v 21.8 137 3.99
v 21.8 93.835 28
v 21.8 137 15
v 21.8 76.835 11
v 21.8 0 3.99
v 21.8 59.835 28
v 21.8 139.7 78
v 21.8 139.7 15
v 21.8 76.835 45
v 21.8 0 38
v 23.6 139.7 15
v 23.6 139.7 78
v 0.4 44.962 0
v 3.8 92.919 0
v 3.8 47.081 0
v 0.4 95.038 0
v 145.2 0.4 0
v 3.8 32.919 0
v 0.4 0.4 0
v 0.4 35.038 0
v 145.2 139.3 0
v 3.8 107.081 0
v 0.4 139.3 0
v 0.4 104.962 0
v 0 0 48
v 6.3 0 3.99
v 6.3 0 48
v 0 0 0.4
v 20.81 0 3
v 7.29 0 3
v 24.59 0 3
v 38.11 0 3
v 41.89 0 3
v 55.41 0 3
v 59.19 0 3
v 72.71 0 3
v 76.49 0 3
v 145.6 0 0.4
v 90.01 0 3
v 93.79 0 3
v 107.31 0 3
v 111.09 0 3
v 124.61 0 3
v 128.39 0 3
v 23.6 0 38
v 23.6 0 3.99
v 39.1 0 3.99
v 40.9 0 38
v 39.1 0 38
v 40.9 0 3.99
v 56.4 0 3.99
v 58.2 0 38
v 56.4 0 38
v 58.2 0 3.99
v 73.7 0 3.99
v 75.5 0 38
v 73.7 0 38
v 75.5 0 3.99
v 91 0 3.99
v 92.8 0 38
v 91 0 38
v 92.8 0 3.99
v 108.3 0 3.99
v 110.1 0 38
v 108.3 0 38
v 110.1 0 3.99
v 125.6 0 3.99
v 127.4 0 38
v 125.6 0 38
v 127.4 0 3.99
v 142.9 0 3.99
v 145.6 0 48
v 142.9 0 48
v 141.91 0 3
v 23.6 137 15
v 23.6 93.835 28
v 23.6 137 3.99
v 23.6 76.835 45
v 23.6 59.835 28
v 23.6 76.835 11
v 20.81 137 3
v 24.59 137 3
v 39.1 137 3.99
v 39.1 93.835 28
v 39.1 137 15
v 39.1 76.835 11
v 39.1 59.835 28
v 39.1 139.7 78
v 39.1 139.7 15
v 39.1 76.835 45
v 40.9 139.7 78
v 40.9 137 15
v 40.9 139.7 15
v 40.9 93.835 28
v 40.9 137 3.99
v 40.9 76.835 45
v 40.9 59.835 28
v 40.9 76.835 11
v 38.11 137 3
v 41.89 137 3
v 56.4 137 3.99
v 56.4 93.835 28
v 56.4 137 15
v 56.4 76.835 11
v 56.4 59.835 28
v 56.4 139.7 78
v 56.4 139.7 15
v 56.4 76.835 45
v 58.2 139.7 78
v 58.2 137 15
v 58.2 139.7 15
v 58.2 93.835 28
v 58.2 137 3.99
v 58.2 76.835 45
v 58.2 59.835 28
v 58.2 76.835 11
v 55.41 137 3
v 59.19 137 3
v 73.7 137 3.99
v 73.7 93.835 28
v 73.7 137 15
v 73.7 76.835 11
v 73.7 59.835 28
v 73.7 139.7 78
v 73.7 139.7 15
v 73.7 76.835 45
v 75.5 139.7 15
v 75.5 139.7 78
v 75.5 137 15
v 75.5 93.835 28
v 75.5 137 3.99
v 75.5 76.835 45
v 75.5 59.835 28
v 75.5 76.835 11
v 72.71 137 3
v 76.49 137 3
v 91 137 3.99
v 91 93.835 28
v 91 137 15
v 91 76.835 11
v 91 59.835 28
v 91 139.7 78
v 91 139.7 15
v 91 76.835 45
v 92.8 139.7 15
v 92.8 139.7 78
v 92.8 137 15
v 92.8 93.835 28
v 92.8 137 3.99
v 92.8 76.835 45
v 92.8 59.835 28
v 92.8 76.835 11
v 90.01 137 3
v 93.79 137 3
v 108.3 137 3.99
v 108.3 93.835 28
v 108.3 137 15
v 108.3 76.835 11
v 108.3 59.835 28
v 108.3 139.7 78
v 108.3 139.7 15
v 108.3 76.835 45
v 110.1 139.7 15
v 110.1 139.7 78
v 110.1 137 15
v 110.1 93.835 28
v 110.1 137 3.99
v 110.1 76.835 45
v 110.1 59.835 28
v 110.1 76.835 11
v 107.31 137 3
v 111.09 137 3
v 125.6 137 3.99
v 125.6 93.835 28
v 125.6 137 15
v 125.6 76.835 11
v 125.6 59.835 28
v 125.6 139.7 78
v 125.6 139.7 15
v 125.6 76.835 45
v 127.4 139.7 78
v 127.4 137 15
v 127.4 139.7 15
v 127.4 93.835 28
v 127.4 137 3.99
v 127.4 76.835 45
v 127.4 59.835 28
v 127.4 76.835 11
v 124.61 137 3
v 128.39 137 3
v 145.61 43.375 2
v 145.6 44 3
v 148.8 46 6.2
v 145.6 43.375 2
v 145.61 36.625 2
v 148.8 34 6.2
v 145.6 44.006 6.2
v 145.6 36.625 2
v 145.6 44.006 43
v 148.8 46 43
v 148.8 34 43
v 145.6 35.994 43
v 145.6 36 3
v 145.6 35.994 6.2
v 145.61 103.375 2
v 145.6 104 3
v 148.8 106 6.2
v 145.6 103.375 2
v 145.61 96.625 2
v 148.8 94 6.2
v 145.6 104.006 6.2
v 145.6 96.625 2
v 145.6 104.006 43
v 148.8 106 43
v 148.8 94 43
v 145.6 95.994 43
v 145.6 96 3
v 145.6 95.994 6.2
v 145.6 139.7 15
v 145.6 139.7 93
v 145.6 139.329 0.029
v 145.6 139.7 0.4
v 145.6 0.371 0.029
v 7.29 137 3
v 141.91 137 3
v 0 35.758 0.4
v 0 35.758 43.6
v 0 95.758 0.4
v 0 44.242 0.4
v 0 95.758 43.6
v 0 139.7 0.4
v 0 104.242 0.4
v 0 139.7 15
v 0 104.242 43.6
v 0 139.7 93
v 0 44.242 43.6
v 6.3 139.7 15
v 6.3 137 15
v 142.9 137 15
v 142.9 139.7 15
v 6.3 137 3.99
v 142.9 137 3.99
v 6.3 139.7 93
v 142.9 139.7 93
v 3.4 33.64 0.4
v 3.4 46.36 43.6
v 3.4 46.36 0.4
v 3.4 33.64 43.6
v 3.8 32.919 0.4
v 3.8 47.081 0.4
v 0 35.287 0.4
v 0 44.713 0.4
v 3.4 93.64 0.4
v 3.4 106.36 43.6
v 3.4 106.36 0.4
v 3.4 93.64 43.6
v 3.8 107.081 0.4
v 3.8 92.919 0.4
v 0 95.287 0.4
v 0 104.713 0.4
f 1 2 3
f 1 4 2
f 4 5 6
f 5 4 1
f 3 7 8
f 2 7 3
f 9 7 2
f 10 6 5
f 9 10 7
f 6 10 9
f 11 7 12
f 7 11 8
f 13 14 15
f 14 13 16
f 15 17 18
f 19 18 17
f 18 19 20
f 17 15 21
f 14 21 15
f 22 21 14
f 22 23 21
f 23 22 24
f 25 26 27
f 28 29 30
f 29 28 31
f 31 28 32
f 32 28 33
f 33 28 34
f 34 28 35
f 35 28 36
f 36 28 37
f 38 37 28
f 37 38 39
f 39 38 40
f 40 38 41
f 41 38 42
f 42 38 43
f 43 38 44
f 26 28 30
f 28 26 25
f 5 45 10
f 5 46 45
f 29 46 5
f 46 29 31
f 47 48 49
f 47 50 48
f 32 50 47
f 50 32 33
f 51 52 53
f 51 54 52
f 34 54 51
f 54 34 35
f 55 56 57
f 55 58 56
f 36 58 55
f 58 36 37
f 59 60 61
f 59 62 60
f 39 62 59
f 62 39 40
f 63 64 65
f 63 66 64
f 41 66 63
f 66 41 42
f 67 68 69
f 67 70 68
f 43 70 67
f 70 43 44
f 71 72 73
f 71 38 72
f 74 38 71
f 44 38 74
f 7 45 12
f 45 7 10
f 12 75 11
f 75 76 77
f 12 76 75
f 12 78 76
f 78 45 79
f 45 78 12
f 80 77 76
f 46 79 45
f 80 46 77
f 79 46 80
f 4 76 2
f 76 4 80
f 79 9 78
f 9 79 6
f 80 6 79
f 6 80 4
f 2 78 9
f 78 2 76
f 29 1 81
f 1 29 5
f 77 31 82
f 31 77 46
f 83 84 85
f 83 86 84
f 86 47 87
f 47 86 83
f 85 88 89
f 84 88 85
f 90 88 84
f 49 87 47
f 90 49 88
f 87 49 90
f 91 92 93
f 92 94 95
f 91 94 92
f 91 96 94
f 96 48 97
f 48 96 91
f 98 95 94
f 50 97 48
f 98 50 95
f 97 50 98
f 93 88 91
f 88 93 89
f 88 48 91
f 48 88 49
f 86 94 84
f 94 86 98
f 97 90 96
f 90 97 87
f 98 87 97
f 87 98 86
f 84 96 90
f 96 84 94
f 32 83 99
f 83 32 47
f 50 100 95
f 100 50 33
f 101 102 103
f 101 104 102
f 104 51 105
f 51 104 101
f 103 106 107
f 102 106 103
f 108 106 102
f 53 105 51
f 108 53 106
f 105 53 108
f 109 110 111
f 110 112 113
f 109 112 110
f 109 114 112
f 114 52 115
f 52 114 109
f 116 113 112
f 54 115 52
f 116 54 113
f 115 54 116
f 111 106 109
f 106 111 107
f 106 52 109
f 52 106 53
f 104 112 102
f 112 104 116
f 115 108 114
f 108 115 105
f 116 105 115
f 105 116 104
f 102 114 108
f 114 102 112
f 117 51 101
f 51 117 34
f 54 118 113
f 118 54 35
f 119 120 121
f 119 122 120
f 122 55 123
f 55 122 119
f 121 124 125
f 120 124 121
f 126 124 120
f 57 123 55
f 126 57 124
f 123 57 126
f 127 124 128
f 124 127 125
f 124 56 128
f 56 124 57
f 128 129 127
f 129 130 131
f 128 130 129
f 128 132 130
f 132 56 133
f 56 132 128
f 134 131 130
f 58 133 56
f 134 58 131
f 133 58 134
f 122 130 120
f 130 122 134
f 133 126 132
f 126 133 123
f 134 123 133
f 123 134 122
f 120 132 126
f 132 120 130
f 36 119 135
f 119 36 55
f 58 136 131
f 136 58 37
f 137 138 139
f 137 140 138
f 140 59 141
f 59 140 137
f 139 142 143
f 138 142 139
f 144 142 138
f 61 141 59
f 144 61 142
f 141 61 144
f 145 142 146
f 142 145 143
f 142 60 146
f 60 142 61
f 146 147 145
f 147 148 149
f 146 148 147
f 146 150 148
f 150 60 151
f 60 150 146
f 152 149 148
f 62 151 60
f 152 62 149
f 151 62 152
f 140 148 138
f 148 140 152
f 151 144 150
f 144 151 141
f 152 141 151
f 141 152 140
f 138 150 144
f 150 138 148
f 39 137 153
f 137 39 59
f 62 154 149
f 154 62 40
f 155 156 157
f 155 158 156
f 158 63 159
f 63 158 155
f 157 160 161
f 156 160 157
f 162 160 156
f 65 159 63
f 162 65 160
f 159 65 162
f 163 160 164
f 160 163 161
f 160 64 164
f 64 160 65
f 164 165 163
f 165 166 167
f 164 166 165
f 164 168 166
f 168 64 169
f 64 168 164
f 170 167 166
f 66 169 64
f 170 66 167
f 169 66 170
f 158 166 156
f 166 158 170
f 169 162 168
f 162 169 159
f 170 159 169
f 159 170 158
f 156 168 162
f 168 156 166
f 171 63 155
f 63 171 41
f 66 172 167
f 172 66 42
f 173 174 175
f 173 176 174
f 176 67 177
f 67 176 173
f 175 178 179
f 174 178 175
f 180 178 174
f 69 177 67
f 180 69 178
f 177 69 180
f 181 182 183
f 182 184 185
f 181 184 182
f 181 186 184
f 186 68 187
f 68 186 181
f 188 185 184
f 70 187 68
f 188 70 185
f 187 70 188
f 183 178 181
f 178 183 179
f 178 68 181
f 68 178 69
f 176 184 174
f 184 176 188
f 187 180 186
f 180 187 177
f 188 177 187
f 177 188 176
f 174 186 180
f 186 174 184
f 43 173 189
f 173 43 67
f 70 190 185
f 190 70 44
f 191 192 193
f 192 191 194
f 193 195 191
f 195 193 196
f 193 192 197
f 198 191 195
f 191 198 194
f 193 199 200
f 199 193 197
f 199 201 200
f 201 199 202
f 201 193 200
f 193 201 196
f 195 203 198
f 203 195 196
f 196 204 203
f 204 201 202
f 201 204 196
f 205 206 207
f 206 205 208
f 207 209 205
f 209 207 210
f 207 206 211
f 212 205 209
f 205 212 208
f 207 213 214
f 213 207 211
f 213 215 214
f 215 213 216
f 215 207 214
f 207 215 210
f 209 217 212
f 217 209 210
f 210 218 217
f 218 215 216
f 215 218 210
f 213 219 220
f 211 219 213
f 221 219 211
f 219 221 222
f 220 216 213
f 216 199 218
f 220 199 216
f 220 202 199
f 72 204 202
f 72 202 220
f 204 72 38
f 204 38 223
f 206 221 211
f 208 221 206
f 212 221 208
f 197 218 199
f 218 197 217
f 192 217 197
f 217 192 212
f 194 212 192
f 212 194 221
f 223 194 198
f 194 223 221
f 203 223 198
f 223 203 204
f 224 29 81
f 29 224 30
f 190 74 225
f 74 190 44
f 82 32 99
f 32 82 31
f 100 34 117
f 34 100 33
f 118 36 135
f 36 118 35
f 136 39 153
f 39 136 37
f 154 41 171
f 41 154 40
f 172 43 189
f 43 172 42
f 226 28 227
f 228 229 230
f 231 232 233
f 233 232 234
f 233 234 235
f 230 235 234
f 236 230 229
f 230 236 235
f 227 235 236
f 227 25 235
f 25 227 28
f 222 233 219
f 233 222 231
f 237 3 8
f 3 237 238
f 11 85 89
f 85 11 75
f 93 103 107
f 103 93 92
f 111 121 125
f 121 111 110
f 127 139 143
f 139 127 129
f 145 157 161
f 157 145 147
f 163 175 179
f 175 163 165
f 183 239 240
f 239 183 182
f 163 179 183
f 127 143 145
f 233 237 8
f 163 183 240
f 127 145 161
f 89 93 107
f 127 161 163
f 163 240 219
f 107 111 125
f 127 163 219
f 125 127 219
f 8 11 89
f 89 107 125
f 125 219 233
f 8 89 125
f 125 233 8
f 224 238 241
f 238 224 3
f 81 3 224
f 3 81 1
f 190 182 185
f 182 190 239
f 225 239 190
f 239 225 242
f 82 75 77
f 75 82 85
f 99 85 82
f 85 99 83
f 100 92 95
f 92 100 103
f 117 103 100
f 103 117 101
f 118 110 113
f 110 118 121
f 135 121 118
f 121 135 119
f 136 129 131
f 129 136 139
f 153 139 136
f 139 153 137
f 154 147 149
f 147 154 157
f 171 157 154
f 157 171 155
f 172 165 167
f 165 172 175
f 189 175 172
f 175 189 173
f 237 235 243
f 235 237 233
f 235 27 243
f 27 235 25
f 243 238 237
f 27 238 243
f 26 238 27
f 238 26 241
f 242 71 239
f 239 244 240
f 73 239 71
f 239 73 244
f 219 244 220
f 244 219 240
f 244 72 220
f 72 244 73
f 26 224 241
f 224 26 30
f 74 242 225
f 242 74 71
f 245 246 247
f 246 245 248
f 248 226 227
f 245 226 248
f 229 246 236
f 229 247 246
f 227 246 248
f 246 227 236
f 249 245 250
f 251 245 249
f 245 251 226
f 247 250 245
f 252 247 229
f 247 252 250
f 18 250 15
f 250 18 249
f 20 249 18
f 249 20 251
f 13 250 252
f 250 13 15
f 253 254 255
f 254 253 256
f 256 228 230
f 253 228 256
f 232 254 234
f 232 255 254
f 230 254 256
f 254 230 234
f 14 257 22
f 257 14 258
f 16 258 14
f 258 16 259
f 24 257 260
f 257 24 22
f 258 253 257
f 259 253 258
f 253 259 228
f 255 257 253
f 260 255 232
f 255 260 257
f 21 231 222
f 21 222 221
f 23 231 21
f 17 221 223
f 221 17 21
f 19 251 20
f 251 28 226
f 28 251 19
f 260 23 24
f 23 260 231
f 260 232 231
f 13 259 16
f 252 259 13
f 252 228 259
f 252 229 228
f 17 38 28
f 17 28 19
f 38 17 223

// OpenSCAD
// === DESCRIPTION ===
// PS5 Game Case Rack: a modular, spine-out shelf rack for PlayStation 5 game
//  cases (the blue Blu-ray-style cases, ~135 x 171 x 14 mm). Each module
//  holds 8 cases standing upright like books, spines facing the front, with
//  a sloped divider between every case so they can't topple. Modules chain
//  side by side with a sliding vertical dovetail: two modules = 16 cases,
//  covering a 10-15 game collection with room to grow.
// Physical context: sits on a desk, shelf or TV unit, indoors. Loads are just
//  the cases' weight (~100 g each) pressing down on the base and leaning
//  sideways on the dividers.
//
// Design decisions:
//   - Modules, not one long rack: 15 cases in one piece is ~265 mm, over the
//     256 mm bed (and the Bambu X1/P1 front-left cutter exclusion leaves only
//     ~220 mm centred). One 8-slot module is ~146 mm wide.
//   - Identical modules: each has a dovetail RAIL on its right end wall and a
//     dovetail SLOT in its left end wall, so you print the same file N times.
//     To join, lower the right-hand module onto the left one's rail; its slot
//     is open at the bottom and closed at the top (the closed top is a stop).
//   - Printed flat on the base: dividers and end walls are vertical walls, the
//     dovetail is a vertical extrusion, and the divider windows are diamonds
//     (45 deg faces), so nothing needs support. Sideways case loads bend the
//     dividers within the layer plane, not across layers.
//   - Divider tops slope up toward the back: low at the front so the spine
//     labels show, tall at the back where the leverage is.
//   - Base depth matches the case depth, with a low back stop so every spine
//     lines up flush with the front edge.
//
// Terminology -> code:
//   "the cases" / "games"   -> case_thick, case_depth, case_height
//   "slots" / "how many"    -> slots_per_module, slot_clear, slot_w
//   "dividers"              -> divider_thick, divider_front_h, divider_back_h, divider()
//   "windows in dividers"   -> window_half, window_y, window_z, divider_window()
//   "end walls"             -> end_front_h, end_back_h, left_wall_thick, right_wall_thick
//   "the base"              -> base_thick, base()
//   "back stop"             -> back_stop_h, back_stop_thick
//   "joint" / "dovetail"    -> dt_neck, dt_head, dt_depth, dt_height, dt_ys, dovetail_2d()
//
// Common modifications:
//   Thicker / thinner cases       -> case_thick (slot_w follows; keep slot_clear >= 1.0)
//   More or fewer per module      -> slots_per_module (module_w must stay <= 220 for the
//                                    stock Bambu bed; 9 slots still fits, 13 is the 256 max)
//   Taller dividers               -> divider_back_h (end_back_h must stay >= it)
//   Joint too tight / loose       -> dt_tol (PLA 0.2 default; 0.3 if your printer over-extrudes)
//   Different printer             -> build_x/y/z, and check module_w and base_depth fit
//
// Overall dimensions: 145.6 W (148.8 incl. dovetail rail) x 139.7 D x 93 H mm per module (fits the Bambu
//  P1S / X1C / A1 256 mm bed, inside the 220 mm X1/P1 cutter exclusion).
// Coordinate system: X = along the row of cases (left to right, facing the
//  spines), Y = front (0) to back, Z = up from the build plate.
// NOTE: Model is in print orientation and use orientation - they are the same.

// === PRINTER ===
// Printer: Bambu Lab P1S / X1C / A1
// Build Volume: 256 x 256 x 256 mm

// === PRINT SETTINGS ===
// Material: PLA - indoor, lightly loaded, best dimensional accuracy for the dovetail.
//   (PETG works too; raise dt_tol to 0.3.)
// Layer Height: 0.2mm
// Walls/Perimeters: 3 (dividers are exactly 4 extrusion widths, so they print solid)
// Infill: 15% gyroid
// Supports: None required (all walls vertical; divider windows are 45 deg diamonds;
//   dovetail rails have 45 deg chamfered undersides - ~56 mm2 of small flank faces sit
//   at ~50 deg, well inside PLA's 60-70 deg capability)
// Orientation: As modeled - base flat on the plate.
// Notes: Print one module per 8 games. Textured PEI plate recommended. To join two
//   modules: lift the right-hand module ~45 mm above the left one's two rails, line its
//   left-wall slots up over them, and lower it straight down until both sit on the table.
//   If the fit is tight, a few strokes of sandpaper on the rails fixes it.

// === PARAMETERS ===
// Printer settings
nozzle_diameter = 0.4;
layer_height = 0.2;
build_x = 256;
build_y = 256;
build_z = 256;
bambu_safe_w = 220;        // usable centred width with the X1/P1 cutter exclusion

// The cases (PS5 standard game case)
case_thick  = 14.0;        // spine thickness
case_depth  = 135.0;       // front-to-back when standing spine-out
case_height = 171.0;       // standing height

// Slots
slots_per_module = 8;
slot_clear = 1.5;          // total side clearance per slot so cases slide in easily

// Base
base_thick = 3.0;
back_stop_h = 12;          // height above the base
back_stop_thick = 2.7;     // 6 extrusion widths

// Dividers (heights measured from the top of the base)
divider_front_h = 35;
divider_back_h  = 75;

// End walls (heights from top of base)
end_front_h = 45;
end_back_h  = 90;

// Divider windows (material saving, diamond = support-free)
window_half = 17;          // half-diagonal of the diamond
window_y_frac = 0.55;      // window centre as a fraction of base depth
window_z = 25;             // window centre height above the base top

// Dovetail joint (rail on the right wall, slot in the left wall)
dt_neck   = 8;             // width where the rail meets the wall
dt_head   = 12;            // width at the rail's outer face
dt_depth  = 3.2;           // how far the rail sticks out
dt_tol    = 0.2;           // clearance per side (PLA)
dt_ys     = [40, 100];     // rail centre positions front-to-back (two rails stop the joint twisting)
dt_top_gap = 0.6;          // slot extends this far above the rail top (vertical play)

// === DERIVED CONSTANTS ===
extrusion_width = nozzle_diameter * 1.125;          // 0.45
divider_thick    = extrusion_width * 4;             // 1.8
right_wall_thick = extrusion_width * 6;             // 2.7
left_wall_thick  = extrusion_width * 14;            // 6.3 - houses the dovetail slot
fudge = 0.01;
tolerance = 0.2;
ef_chamfer = 0.4;
fillet = 1.0;                                       // 45 deg root fillet at divider bases
$fn = $preview ? 32 : 64;

slot_w = case_thick + slot_clear;                   // 15.5
base_depth = case_depth + back_stop_thick + 2;      // case + stop + 2 mm play
module_w = left_wall_thick + slots_per_module * slot_w
         + (slots_per_module - 1) * divider_thick + right_wall_thick;
total_h = base_thick + end_back_h;
dt_height = base_thick + end_front_h - 5;           // rail height from the plate
window_y = base_depth * window_y_frac;

// x position of the left face of slot i (0-based)
function slot_x(i) = left_wall_thick + i * (slot_w + divider_thick);
// divider top height (above base top) at depth y
function divider_h_at(y) = divider_front_h + (divider_back_h - divider_front_h) * y / base_depth;
function end_h_at(y) = end_front_h + (end_back_h - end_front_h) * y / base_depth;

// === CONTRACTS ===
assert(slot_w >= case_thick + 1.0, "slot too tight for a PS5 case");
assert(module_w <= bambu_safe_w, str("module ", module_w, " mm too wide for the Bambu bed"));
assert(base_depth <= bambu_safe_w, "module too deep for the Bambu bed");
assert(total_h <= build_z, "too tall");
assert(divider_front_h >= case_height * 0.2, "dividers too short to hold cases upright");
assert(end_back_h >= divider_back_h, "end walls must be at least as tall as dividers");
assert(base_depth - back_stop_thick >= case_depth, "case doesn't fit in front of the back stop");
// fillet must not stop the case seating: case is lifted by fillet - clear/2 at most
assert(fillet - slot_clear / 2 <= 0.5, "root fillets lift the case too far");
// diamond window stays inside the divider with >= 5 mm of material all round
assert(window_z - window_half >= 5, "window too close to the base");
assert(window_z + window_half <= divider_h_at(window_y) - 5, "window too close to divider top");
assert(window_y - window_half >= 5 && window_y + window_half <= base_depth - 5, "window off the divider");
// dovetail: slot leaves real wall behind it, rail sits inside the end-wall profile
assert(left_wall_thick - (dt_depth + dt_tol) >= 3 * extrusion_width, "wall behind dovetail slot too thin");
assert(dt_head > dt_neck, "dovetail must flare to lock");
assert(dt_ys[0] - dt_head / 2 - dt_tol >= 5, "dovetail too close to the front");
assert(dt_ys[len(dt_ys) - 1] + dt_head / 2 + dt_tol <= base_depth - 5, "dovetail too close to the back");
for (y = dt_ys) assert(dt_height + dt_top_gap <= base_thick + end_h_at(y - dt_head / 2) - 2, "dovetail slot breaks out of the wall top");

echo(module_w = module_w, base_depth = base_depth, total_h = total_h,
     slot_w = slot_w, cases_per_2_modules = 2 * slots_per_module);

// === MODULES ===

// Side profile (in Y-Z) of a wall with a sloped top, extruded along X.
module sloped_wall(x0, thick, front_h, back_h) {
    translate([x0, 0, 0])
        rotate([90, 0, 90])
            linear_extrude(height = thick)
                polygon([[0, 0], [base_depth, 0],
                         [base_depth, base_thick + back_h],
                         [0, base_thick + front_h]]);
}

// Base plate with elephant-foot chamfer on the bottom edges.
module base() {
    hull() {
        translate([ef_chamfer, ef_chamfer, 0])
            cube([module_w - 2 * ef_chamfer, base_depth - 2 * ef_chamfer, fudge]);
        translate([0, 0, ef_chamfer])
            cube([module_w, base_depth, base_thick - ef_chamfer]);
    }
}

module back_stop() {
    translate([0, base_depth - back_stop_thick, base_thick - fudge])
        cube([module_w, back_stop_thick, back_stop_h + fudge]);
}

// Diamond window cutter, axis along X, spanning thickness t.
module divider_window(x0, t) {
    translate([x0 - fudge, window_y, base_thick + window_z])
        rotate([0, 90, 0])
            linear_extrude(height = t + 2 * fudge)
                rotate(45) square(window_half * sqrt(2), center = true);
}

// 45 deg fillet strip along Y at the root of a wall, on one side.
module root_fillet(x_face, dir) {
    // dir = +1 fillet sits at x > x_face, -1 at x < x_face
    translate([x_face, 0, base_thick - fudge])
        rotate([-90, 0, 0])
            linear_extrude(height = base_depth - back_stop_thick + fudge)
                polygon([[-dir * fudge, 0], [dir * fillet, 0], [-dir * fudge, -fillet - fudge]]);
}

module divider(i) {
    x0 = slot_x(i) + slot_w;     // divider sits right of slot i
    difference() {
        sloped_wall(x0, divider_thick, divider_front_h, divider_back_h);
        divider_window(x0, divider_thick);
    }
    root_fillet(x0, -1);
    root_fillet(x0 + divider_thick, +1);
}

// Dovetail cross-section in X-Y; x=0 is the wall face, rail grows toward +x.
module dovetail_2d(grow = 0) {
    offset(delta = grow)
        polygon([[-fudge, -dt_neck / 2], [dt_depth, -dt_head / 2],
                 [dt_depth, dt_head / 2], [-fudge, dt_neck / 2]]);
}

// The rail's underside is a 45 deg chamfer growing out of the wall, so it
// never touches the plate (no first-layer island) and needs no support.
// Its root strip sinks rail_root mm into the right wall so it is properly fused.
rail_root = 1.0;
// width of the buried root: the dovetail flank extended rail_root into the wall,
// so the hull never widens the neck past the slot clearance
rail_root_w = dt_neck - 2 * rail_root * ((dt_head - dt_neck) / 2) / dt_depth;
assert(rail_root_w > 0, "rail root too deep for this dovetail angle");
module dovetail_rail() {
    for (y = dt_ys) translate([module_w, y, 0])
        hull() {
            translate([0, 0, base_thick - rail_root])   // keeps the underside at 45 deg
                linear_extrude(height = fudge)
                    translate([-rail_root, -rail_root_w / 2]) square([rail_root + fudge, rail_root_w]);
            translate([-rail_root, -rail_root_w / 2, base_thick + dt_depth])
                cube([rail_root, rail_root_w, dt_height - base_thick - dt_depth]);
            translate([0, 0, base_thick + dt_depth])
                linear_extrude(height = dt_height - base_thick - dt_depth) dovetail_2d();
        }
}

// Slot cutter in the left wall, open at the bottom, closed at the top.
module dovetail_slot() {
    for (y = dt_ys) translate([0, y, -fudge]) {
        linear_extrude(height = dt_height + dt_top_gap + fudge)
            dovetail_2d(dt_tol);
        // flared mouth so the slot's own elephant foot doesn't bind
        linear_extrude(height = ef_chamfer + fudge)
            dovetail_2d(dt_tol + ef_chamfer);
    }
}

// Envelope whose bottom edges are chamfered 45 deg by ef_chamfer: intersecting
// with it puts elephant-foot compensation on every wall and divider foot.
module ef_envelope() {
    big_w = module_w + dt_depth + 2;
    hull() {
        translate([ef_chamfer, ef_chamfer, 0])
            cube([module_w - 2 * ef_chamfer, base_depth - 2 * ef_chamfer, fudge]);
        translate([-fudge, -fudge, ef_chamfer + fudge])   // rise = run, exactly 45 deg
            cube([big_w, base_depth + 2 * fudge, total_h]);
    }
}

module rack_module() {
    intersection() {
    ef_envelope();
    difference() {
        union() {
            base();
            back_stop();
            sloped_wall(0, left_wall_thick, end_front_h, end_back_h);
            sloped_wall(module_w - right_wall_thick, right_wall_thick, end_front_h, end_back_h);
            root_fillet(left_wall_thick, +1);
            root_fillet(module_w - right_wall_thick, -1);
            for (i = [0 : slots_per_module - 2]) divider(i);
            dovetail_rail();
        }
        dovetail_slot();
    }
    }
}

// Placeholder case for the assembly view.
module ps5_case() {
    color("royalblue", 0.6) cube([case_thick, case_depth, case_height]);
}

module assembly() {
    for (m = [0 : 1]) {
        translate([m * (module_w + fudge), 0, 0]) {
            color("white") rack_module();
            for (i = [0 : slots_per_module - 1])
                if (m * slots_per_module + i < 15)
                    translate([slot_x(i) + slot_clear / 2, 0, base_thick + fudge]) ps5_case();
        }
    }
}

// === ASSEMBLY / RENDER ===
part = "rack_module"; // "all", "rack_module", "clash_joint", "clash_case"
if (part == "all")         assembly();
if (part == "rack_module") rack_module();
// joined pose: second module's left face sits fudge right of the first's right face
if (part == "clash_joint") intersection() {
    rack_module();
    translate([module_w + fudge, 0, 0]) rack_module();
}
// every case clears the rack
if (part == "clash_case") intersection() {
    rack_module();
    for (i = [0 : slots_per_module - 1])
        translate([slot_x(i) + slot_clear / 2, 0, base_thick + fillet]) ps5_case();
}
